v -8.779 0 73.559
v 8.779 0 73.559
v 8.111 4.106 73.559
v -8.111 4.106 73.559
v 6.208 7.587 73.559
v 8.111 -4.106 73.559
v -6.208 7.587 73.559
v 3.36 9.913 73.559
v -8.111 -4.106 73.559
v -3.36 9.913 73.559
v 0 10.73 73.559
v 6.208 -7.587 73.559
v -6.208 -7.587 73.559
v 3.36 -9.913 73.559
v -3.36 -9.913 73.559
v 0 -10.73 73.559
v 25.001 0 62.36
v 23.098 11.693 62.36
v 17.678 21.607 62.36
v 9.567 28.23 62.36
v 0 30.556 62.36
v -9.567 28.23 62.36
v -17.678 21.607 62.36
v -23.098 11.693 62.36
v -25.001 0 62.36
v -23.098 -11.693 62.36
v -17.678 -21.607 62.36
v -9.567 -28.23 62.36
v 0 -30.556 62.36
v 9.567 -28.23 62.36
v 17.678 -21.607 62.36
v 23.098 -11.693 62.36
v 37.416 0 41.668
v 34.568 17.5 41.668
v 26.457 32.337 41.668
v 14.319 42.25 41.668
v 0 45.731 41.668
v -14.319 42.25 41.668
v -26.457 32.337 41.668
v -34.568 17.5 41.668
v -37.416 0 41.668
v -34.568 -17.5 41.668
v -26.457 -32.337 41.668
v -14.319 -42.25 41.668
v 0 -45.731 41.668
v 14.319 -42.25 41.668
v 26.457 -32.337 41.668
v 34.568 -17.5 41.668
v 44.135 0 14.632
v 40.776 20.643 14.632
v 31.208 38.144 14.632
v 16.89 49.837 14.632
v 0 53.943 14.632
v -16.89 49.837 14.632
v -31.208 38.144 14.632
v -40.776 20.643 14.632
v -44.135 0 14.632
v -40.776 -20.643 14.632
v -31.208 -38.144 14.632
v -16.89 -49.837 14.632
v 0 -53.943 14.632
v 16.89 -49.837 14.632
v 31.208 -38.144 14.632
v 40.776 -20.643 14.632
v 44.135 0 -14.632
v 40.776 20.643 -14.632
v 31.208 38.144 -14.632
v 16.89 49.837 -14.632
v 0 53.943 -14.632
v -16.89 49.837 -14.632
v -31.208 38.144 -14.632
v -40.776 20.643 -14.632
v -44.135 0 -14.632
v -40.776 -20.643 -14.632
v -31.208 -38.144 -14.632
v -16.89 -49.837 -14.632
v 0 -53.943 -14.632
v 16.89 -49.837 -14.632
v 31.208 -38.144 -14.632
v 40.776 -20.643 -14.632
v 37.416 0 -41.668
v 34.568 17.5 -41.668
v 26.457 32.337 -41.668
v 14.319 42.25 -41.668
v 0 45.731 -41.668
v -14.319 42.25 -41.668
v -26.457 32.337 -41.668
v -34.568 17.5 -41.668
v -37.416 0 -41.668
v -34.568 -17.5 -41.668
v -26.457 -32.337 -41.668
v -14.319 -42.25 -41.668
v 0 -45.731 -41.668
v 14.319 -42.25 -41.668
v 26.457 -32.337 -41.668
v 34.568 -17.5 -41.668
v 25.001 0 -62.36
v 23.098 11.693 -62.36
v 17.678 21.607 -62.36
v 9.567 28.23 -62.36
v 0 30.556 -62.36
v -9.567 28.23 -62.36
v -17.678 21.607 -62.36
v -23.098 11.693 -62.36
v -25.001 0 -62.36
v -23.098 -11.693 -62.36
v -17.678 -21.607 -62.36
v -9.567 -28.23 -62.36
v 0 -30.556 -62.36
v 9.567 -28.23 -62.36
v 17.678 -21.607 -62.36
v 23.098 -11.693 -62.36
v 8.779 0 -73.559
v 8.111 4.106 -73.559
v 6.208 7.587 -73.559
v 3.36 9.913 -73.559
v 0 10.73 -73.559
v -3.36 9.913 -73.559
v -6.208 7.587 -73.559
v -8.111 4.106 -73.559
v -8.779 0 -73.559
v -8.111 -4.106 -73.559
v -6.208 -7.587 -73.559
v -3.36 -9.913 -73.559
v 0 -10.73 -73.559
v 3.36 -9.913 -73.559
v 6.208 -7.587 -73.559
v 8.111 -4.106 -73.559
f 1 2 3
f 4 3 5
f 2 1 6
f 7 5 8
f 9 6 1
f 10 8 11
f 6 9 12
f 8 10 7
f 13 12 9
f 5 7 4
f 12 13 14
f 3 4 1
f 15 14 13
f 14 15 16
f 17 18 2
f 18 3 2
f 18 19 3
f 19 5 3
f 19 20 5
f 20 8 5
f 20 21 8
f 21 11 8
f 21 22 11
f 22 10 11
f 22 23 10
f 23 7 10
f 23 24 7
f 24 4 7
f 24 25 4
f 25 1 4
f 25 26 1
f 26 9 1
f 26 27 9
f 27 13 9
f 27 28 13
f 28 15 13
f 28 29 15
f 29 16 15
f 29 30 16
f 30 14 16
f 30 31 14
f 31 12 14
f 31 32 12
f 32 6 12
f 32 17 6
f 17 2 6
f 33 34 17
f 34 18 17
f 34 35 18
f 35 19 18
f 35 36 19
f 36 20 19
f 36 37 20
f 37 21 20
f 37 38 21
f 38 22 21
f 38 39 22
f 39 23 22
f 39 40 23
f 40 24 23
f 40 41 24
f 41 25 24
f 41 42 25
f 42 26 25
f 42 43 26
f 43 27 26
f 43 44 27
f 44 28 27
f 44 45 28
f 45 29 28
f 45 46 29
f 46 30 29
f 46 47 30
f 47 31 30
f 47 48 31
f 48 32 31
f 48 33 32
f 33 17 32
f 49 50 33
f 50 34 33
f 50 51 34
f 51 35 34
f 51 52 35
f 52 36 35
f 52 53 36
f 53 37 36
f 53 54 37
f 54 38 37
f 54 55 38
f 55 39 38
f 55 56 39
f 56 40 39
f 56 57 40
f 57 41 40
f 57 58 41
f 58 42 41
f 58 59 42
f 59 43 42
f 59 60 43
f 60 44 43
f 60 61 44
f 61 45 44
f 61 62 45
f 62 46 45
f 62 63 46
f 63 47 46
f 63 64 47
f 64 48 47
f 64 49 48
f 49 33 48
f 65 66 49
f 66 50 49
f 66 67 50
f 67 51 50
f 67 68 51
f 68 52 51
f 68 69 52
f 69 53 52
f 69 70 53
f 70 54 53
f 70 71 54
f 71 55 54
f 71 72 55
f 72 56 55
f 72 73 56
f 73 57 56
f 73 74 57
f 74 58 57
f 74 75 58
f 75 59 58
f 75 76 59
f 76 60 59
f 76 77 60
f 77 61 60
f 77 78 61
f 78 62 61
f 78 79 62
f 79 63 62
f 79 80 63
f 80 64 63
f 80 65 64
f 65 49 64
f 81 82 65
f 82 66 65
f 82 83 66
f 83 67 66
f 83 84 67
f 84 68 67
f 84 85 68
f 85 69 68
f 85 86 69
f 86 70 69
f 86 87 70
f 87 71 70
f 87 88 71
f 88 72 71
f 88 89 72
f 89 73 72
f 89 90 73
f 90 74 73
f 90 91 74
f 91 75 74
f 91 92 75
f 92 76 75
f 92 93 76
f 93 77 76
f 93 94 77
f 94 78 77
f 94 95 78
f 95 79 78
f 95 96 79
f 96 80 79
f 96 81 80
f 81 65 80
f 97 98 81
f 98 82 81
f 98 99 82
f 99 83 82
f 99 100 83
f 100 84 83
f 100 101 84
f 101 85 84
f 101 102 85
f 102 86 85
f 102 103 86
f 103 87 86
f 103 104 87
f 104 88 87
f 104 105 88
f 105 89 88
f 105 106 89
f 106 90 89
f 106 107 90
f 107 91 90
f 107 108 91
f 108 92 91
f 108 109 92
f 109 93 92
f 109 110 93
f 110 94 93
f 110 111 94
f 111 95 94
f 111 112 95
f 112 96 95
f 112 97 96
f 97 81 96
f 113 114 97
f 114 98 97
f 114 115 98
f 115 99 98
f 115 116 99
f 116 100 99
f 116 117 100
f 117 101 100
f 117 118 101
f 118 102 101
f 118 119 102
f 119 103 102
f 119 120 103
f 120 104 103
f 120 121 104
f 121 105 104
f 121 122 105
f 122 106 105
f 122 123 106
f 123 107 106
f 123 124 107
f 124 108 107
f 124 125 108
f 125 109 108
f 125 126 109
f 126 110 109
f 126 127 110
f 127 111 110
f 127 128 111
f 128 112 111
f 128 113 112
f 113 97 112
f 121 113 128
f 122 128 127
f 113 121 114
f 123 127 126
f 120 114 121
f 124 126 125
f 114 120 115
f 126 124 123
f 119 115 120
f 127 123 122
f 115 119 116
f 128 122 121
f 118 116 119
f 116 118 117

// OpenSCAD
// Generated by SolidPython 1.0.1 on 2020-07-29 00:46:48


scale(v = [9, 11, 15]) {
	sphere(r = 5);
}
/***********************************************
*********      SolidPython code:      **********
************************************************
 
# import packages: SolidPython
from solid import *
from solid.utils import *
from itertools import chain, combinations, permutations


class Resize:

    def __init__(self, scad_file):
        self.scad_file = scad_file
        #self.scad_file = import_scad(scad_file)
        # cone/cylinder param:
        self.r1 = 0
        self.r2 = 0
        self.h = 0
        # rectangular prism param:
        self.w = 0
        self.l = 0
        # ellipse param:
        self.r = 0

    # import OpenScad code (file name corresponds to shape)


    # classify shape + parameters
    def assign(self, param1, param2, param3):
        if self.scad_file == 'cone.scad':
            self.r1 = param1
            self.r2 = param2
            self.h = param3
        elif self.scad_file == 'cylinder.scad':
            self.r1 = param1
            self.r2 = param2
            self.h = param3
        elif self.scad_file == 'rectangularPrism.scad':
            self.h = param1
            self.l = param2
            self.w = param3
        else:
            self.r = param1
            self.h = param2

    # resize parameters
    def iterate(self):
        x = range(3, 20, 2)
        i = 1
        if self.scad_file == 'cone.scad':
            tempList = list(permutations(x, 2))
            for temp in tempList:
                param1 = temp[0]
                param2 = temp[1]
                filepath = 'produced_scad_files/' + 'cone' + str(param1) + '_' + str(param2) + '_' + '.scad'
                scad_render_to_file(cylinder(h=param1, r1=param2, r2=0), filepath)

        elif self.scad_file == 'cylinder.scad':
            tempList = list(permutations(x, 3))
            for temp in tempList:
                param1 = temp[0]
                param2 = temp[1]
                filepath = 'produced_scad_files/' + 'cylinder' + str(param1) + '_' + str(param2) + '_' + '.scad'
                scad_render_to_file(cylinder(h=param1, r1=param2, r2=param2), filepath)

        elif self.scad_file == 'rectangularPrism.scad':
            tempList = list(permutations(x, 3))
            for temp in tempList:
                param1 = temp[0]
                param2 = temp[1]
                param3 = temp[2]
                filepath = 'produced_scad_files/' + 'rectangularPrism' + str(param1) + '_' + str(param2) + '_' + str(
                    param3) + '.scad'
                scad_render_to_file(cube(size=(param1, param2, param3)), filepath)

        elif self.scad_file == 'ellipse.scad':
            tempList = list(permutations(x, 4))
            for temp in tempList:
                param1 = temp[0]
                param2 = temp[1]
                param3 = temp[2]
                param4 = temp[3]
                filepath = 'produced_scad_files/' + 'ellipse' + str(param1) + '_' + str(param2) + '_' + str(param3) + '_' + str(param4) + '.scad'
                scad_render_to_file(scale([param1, param2, param3])(sphere(r=param4)), filepath)

    def render_to_scadfile(self):
        scad_render_to_file(scad, 'example.scad') 
 
************************************************/
